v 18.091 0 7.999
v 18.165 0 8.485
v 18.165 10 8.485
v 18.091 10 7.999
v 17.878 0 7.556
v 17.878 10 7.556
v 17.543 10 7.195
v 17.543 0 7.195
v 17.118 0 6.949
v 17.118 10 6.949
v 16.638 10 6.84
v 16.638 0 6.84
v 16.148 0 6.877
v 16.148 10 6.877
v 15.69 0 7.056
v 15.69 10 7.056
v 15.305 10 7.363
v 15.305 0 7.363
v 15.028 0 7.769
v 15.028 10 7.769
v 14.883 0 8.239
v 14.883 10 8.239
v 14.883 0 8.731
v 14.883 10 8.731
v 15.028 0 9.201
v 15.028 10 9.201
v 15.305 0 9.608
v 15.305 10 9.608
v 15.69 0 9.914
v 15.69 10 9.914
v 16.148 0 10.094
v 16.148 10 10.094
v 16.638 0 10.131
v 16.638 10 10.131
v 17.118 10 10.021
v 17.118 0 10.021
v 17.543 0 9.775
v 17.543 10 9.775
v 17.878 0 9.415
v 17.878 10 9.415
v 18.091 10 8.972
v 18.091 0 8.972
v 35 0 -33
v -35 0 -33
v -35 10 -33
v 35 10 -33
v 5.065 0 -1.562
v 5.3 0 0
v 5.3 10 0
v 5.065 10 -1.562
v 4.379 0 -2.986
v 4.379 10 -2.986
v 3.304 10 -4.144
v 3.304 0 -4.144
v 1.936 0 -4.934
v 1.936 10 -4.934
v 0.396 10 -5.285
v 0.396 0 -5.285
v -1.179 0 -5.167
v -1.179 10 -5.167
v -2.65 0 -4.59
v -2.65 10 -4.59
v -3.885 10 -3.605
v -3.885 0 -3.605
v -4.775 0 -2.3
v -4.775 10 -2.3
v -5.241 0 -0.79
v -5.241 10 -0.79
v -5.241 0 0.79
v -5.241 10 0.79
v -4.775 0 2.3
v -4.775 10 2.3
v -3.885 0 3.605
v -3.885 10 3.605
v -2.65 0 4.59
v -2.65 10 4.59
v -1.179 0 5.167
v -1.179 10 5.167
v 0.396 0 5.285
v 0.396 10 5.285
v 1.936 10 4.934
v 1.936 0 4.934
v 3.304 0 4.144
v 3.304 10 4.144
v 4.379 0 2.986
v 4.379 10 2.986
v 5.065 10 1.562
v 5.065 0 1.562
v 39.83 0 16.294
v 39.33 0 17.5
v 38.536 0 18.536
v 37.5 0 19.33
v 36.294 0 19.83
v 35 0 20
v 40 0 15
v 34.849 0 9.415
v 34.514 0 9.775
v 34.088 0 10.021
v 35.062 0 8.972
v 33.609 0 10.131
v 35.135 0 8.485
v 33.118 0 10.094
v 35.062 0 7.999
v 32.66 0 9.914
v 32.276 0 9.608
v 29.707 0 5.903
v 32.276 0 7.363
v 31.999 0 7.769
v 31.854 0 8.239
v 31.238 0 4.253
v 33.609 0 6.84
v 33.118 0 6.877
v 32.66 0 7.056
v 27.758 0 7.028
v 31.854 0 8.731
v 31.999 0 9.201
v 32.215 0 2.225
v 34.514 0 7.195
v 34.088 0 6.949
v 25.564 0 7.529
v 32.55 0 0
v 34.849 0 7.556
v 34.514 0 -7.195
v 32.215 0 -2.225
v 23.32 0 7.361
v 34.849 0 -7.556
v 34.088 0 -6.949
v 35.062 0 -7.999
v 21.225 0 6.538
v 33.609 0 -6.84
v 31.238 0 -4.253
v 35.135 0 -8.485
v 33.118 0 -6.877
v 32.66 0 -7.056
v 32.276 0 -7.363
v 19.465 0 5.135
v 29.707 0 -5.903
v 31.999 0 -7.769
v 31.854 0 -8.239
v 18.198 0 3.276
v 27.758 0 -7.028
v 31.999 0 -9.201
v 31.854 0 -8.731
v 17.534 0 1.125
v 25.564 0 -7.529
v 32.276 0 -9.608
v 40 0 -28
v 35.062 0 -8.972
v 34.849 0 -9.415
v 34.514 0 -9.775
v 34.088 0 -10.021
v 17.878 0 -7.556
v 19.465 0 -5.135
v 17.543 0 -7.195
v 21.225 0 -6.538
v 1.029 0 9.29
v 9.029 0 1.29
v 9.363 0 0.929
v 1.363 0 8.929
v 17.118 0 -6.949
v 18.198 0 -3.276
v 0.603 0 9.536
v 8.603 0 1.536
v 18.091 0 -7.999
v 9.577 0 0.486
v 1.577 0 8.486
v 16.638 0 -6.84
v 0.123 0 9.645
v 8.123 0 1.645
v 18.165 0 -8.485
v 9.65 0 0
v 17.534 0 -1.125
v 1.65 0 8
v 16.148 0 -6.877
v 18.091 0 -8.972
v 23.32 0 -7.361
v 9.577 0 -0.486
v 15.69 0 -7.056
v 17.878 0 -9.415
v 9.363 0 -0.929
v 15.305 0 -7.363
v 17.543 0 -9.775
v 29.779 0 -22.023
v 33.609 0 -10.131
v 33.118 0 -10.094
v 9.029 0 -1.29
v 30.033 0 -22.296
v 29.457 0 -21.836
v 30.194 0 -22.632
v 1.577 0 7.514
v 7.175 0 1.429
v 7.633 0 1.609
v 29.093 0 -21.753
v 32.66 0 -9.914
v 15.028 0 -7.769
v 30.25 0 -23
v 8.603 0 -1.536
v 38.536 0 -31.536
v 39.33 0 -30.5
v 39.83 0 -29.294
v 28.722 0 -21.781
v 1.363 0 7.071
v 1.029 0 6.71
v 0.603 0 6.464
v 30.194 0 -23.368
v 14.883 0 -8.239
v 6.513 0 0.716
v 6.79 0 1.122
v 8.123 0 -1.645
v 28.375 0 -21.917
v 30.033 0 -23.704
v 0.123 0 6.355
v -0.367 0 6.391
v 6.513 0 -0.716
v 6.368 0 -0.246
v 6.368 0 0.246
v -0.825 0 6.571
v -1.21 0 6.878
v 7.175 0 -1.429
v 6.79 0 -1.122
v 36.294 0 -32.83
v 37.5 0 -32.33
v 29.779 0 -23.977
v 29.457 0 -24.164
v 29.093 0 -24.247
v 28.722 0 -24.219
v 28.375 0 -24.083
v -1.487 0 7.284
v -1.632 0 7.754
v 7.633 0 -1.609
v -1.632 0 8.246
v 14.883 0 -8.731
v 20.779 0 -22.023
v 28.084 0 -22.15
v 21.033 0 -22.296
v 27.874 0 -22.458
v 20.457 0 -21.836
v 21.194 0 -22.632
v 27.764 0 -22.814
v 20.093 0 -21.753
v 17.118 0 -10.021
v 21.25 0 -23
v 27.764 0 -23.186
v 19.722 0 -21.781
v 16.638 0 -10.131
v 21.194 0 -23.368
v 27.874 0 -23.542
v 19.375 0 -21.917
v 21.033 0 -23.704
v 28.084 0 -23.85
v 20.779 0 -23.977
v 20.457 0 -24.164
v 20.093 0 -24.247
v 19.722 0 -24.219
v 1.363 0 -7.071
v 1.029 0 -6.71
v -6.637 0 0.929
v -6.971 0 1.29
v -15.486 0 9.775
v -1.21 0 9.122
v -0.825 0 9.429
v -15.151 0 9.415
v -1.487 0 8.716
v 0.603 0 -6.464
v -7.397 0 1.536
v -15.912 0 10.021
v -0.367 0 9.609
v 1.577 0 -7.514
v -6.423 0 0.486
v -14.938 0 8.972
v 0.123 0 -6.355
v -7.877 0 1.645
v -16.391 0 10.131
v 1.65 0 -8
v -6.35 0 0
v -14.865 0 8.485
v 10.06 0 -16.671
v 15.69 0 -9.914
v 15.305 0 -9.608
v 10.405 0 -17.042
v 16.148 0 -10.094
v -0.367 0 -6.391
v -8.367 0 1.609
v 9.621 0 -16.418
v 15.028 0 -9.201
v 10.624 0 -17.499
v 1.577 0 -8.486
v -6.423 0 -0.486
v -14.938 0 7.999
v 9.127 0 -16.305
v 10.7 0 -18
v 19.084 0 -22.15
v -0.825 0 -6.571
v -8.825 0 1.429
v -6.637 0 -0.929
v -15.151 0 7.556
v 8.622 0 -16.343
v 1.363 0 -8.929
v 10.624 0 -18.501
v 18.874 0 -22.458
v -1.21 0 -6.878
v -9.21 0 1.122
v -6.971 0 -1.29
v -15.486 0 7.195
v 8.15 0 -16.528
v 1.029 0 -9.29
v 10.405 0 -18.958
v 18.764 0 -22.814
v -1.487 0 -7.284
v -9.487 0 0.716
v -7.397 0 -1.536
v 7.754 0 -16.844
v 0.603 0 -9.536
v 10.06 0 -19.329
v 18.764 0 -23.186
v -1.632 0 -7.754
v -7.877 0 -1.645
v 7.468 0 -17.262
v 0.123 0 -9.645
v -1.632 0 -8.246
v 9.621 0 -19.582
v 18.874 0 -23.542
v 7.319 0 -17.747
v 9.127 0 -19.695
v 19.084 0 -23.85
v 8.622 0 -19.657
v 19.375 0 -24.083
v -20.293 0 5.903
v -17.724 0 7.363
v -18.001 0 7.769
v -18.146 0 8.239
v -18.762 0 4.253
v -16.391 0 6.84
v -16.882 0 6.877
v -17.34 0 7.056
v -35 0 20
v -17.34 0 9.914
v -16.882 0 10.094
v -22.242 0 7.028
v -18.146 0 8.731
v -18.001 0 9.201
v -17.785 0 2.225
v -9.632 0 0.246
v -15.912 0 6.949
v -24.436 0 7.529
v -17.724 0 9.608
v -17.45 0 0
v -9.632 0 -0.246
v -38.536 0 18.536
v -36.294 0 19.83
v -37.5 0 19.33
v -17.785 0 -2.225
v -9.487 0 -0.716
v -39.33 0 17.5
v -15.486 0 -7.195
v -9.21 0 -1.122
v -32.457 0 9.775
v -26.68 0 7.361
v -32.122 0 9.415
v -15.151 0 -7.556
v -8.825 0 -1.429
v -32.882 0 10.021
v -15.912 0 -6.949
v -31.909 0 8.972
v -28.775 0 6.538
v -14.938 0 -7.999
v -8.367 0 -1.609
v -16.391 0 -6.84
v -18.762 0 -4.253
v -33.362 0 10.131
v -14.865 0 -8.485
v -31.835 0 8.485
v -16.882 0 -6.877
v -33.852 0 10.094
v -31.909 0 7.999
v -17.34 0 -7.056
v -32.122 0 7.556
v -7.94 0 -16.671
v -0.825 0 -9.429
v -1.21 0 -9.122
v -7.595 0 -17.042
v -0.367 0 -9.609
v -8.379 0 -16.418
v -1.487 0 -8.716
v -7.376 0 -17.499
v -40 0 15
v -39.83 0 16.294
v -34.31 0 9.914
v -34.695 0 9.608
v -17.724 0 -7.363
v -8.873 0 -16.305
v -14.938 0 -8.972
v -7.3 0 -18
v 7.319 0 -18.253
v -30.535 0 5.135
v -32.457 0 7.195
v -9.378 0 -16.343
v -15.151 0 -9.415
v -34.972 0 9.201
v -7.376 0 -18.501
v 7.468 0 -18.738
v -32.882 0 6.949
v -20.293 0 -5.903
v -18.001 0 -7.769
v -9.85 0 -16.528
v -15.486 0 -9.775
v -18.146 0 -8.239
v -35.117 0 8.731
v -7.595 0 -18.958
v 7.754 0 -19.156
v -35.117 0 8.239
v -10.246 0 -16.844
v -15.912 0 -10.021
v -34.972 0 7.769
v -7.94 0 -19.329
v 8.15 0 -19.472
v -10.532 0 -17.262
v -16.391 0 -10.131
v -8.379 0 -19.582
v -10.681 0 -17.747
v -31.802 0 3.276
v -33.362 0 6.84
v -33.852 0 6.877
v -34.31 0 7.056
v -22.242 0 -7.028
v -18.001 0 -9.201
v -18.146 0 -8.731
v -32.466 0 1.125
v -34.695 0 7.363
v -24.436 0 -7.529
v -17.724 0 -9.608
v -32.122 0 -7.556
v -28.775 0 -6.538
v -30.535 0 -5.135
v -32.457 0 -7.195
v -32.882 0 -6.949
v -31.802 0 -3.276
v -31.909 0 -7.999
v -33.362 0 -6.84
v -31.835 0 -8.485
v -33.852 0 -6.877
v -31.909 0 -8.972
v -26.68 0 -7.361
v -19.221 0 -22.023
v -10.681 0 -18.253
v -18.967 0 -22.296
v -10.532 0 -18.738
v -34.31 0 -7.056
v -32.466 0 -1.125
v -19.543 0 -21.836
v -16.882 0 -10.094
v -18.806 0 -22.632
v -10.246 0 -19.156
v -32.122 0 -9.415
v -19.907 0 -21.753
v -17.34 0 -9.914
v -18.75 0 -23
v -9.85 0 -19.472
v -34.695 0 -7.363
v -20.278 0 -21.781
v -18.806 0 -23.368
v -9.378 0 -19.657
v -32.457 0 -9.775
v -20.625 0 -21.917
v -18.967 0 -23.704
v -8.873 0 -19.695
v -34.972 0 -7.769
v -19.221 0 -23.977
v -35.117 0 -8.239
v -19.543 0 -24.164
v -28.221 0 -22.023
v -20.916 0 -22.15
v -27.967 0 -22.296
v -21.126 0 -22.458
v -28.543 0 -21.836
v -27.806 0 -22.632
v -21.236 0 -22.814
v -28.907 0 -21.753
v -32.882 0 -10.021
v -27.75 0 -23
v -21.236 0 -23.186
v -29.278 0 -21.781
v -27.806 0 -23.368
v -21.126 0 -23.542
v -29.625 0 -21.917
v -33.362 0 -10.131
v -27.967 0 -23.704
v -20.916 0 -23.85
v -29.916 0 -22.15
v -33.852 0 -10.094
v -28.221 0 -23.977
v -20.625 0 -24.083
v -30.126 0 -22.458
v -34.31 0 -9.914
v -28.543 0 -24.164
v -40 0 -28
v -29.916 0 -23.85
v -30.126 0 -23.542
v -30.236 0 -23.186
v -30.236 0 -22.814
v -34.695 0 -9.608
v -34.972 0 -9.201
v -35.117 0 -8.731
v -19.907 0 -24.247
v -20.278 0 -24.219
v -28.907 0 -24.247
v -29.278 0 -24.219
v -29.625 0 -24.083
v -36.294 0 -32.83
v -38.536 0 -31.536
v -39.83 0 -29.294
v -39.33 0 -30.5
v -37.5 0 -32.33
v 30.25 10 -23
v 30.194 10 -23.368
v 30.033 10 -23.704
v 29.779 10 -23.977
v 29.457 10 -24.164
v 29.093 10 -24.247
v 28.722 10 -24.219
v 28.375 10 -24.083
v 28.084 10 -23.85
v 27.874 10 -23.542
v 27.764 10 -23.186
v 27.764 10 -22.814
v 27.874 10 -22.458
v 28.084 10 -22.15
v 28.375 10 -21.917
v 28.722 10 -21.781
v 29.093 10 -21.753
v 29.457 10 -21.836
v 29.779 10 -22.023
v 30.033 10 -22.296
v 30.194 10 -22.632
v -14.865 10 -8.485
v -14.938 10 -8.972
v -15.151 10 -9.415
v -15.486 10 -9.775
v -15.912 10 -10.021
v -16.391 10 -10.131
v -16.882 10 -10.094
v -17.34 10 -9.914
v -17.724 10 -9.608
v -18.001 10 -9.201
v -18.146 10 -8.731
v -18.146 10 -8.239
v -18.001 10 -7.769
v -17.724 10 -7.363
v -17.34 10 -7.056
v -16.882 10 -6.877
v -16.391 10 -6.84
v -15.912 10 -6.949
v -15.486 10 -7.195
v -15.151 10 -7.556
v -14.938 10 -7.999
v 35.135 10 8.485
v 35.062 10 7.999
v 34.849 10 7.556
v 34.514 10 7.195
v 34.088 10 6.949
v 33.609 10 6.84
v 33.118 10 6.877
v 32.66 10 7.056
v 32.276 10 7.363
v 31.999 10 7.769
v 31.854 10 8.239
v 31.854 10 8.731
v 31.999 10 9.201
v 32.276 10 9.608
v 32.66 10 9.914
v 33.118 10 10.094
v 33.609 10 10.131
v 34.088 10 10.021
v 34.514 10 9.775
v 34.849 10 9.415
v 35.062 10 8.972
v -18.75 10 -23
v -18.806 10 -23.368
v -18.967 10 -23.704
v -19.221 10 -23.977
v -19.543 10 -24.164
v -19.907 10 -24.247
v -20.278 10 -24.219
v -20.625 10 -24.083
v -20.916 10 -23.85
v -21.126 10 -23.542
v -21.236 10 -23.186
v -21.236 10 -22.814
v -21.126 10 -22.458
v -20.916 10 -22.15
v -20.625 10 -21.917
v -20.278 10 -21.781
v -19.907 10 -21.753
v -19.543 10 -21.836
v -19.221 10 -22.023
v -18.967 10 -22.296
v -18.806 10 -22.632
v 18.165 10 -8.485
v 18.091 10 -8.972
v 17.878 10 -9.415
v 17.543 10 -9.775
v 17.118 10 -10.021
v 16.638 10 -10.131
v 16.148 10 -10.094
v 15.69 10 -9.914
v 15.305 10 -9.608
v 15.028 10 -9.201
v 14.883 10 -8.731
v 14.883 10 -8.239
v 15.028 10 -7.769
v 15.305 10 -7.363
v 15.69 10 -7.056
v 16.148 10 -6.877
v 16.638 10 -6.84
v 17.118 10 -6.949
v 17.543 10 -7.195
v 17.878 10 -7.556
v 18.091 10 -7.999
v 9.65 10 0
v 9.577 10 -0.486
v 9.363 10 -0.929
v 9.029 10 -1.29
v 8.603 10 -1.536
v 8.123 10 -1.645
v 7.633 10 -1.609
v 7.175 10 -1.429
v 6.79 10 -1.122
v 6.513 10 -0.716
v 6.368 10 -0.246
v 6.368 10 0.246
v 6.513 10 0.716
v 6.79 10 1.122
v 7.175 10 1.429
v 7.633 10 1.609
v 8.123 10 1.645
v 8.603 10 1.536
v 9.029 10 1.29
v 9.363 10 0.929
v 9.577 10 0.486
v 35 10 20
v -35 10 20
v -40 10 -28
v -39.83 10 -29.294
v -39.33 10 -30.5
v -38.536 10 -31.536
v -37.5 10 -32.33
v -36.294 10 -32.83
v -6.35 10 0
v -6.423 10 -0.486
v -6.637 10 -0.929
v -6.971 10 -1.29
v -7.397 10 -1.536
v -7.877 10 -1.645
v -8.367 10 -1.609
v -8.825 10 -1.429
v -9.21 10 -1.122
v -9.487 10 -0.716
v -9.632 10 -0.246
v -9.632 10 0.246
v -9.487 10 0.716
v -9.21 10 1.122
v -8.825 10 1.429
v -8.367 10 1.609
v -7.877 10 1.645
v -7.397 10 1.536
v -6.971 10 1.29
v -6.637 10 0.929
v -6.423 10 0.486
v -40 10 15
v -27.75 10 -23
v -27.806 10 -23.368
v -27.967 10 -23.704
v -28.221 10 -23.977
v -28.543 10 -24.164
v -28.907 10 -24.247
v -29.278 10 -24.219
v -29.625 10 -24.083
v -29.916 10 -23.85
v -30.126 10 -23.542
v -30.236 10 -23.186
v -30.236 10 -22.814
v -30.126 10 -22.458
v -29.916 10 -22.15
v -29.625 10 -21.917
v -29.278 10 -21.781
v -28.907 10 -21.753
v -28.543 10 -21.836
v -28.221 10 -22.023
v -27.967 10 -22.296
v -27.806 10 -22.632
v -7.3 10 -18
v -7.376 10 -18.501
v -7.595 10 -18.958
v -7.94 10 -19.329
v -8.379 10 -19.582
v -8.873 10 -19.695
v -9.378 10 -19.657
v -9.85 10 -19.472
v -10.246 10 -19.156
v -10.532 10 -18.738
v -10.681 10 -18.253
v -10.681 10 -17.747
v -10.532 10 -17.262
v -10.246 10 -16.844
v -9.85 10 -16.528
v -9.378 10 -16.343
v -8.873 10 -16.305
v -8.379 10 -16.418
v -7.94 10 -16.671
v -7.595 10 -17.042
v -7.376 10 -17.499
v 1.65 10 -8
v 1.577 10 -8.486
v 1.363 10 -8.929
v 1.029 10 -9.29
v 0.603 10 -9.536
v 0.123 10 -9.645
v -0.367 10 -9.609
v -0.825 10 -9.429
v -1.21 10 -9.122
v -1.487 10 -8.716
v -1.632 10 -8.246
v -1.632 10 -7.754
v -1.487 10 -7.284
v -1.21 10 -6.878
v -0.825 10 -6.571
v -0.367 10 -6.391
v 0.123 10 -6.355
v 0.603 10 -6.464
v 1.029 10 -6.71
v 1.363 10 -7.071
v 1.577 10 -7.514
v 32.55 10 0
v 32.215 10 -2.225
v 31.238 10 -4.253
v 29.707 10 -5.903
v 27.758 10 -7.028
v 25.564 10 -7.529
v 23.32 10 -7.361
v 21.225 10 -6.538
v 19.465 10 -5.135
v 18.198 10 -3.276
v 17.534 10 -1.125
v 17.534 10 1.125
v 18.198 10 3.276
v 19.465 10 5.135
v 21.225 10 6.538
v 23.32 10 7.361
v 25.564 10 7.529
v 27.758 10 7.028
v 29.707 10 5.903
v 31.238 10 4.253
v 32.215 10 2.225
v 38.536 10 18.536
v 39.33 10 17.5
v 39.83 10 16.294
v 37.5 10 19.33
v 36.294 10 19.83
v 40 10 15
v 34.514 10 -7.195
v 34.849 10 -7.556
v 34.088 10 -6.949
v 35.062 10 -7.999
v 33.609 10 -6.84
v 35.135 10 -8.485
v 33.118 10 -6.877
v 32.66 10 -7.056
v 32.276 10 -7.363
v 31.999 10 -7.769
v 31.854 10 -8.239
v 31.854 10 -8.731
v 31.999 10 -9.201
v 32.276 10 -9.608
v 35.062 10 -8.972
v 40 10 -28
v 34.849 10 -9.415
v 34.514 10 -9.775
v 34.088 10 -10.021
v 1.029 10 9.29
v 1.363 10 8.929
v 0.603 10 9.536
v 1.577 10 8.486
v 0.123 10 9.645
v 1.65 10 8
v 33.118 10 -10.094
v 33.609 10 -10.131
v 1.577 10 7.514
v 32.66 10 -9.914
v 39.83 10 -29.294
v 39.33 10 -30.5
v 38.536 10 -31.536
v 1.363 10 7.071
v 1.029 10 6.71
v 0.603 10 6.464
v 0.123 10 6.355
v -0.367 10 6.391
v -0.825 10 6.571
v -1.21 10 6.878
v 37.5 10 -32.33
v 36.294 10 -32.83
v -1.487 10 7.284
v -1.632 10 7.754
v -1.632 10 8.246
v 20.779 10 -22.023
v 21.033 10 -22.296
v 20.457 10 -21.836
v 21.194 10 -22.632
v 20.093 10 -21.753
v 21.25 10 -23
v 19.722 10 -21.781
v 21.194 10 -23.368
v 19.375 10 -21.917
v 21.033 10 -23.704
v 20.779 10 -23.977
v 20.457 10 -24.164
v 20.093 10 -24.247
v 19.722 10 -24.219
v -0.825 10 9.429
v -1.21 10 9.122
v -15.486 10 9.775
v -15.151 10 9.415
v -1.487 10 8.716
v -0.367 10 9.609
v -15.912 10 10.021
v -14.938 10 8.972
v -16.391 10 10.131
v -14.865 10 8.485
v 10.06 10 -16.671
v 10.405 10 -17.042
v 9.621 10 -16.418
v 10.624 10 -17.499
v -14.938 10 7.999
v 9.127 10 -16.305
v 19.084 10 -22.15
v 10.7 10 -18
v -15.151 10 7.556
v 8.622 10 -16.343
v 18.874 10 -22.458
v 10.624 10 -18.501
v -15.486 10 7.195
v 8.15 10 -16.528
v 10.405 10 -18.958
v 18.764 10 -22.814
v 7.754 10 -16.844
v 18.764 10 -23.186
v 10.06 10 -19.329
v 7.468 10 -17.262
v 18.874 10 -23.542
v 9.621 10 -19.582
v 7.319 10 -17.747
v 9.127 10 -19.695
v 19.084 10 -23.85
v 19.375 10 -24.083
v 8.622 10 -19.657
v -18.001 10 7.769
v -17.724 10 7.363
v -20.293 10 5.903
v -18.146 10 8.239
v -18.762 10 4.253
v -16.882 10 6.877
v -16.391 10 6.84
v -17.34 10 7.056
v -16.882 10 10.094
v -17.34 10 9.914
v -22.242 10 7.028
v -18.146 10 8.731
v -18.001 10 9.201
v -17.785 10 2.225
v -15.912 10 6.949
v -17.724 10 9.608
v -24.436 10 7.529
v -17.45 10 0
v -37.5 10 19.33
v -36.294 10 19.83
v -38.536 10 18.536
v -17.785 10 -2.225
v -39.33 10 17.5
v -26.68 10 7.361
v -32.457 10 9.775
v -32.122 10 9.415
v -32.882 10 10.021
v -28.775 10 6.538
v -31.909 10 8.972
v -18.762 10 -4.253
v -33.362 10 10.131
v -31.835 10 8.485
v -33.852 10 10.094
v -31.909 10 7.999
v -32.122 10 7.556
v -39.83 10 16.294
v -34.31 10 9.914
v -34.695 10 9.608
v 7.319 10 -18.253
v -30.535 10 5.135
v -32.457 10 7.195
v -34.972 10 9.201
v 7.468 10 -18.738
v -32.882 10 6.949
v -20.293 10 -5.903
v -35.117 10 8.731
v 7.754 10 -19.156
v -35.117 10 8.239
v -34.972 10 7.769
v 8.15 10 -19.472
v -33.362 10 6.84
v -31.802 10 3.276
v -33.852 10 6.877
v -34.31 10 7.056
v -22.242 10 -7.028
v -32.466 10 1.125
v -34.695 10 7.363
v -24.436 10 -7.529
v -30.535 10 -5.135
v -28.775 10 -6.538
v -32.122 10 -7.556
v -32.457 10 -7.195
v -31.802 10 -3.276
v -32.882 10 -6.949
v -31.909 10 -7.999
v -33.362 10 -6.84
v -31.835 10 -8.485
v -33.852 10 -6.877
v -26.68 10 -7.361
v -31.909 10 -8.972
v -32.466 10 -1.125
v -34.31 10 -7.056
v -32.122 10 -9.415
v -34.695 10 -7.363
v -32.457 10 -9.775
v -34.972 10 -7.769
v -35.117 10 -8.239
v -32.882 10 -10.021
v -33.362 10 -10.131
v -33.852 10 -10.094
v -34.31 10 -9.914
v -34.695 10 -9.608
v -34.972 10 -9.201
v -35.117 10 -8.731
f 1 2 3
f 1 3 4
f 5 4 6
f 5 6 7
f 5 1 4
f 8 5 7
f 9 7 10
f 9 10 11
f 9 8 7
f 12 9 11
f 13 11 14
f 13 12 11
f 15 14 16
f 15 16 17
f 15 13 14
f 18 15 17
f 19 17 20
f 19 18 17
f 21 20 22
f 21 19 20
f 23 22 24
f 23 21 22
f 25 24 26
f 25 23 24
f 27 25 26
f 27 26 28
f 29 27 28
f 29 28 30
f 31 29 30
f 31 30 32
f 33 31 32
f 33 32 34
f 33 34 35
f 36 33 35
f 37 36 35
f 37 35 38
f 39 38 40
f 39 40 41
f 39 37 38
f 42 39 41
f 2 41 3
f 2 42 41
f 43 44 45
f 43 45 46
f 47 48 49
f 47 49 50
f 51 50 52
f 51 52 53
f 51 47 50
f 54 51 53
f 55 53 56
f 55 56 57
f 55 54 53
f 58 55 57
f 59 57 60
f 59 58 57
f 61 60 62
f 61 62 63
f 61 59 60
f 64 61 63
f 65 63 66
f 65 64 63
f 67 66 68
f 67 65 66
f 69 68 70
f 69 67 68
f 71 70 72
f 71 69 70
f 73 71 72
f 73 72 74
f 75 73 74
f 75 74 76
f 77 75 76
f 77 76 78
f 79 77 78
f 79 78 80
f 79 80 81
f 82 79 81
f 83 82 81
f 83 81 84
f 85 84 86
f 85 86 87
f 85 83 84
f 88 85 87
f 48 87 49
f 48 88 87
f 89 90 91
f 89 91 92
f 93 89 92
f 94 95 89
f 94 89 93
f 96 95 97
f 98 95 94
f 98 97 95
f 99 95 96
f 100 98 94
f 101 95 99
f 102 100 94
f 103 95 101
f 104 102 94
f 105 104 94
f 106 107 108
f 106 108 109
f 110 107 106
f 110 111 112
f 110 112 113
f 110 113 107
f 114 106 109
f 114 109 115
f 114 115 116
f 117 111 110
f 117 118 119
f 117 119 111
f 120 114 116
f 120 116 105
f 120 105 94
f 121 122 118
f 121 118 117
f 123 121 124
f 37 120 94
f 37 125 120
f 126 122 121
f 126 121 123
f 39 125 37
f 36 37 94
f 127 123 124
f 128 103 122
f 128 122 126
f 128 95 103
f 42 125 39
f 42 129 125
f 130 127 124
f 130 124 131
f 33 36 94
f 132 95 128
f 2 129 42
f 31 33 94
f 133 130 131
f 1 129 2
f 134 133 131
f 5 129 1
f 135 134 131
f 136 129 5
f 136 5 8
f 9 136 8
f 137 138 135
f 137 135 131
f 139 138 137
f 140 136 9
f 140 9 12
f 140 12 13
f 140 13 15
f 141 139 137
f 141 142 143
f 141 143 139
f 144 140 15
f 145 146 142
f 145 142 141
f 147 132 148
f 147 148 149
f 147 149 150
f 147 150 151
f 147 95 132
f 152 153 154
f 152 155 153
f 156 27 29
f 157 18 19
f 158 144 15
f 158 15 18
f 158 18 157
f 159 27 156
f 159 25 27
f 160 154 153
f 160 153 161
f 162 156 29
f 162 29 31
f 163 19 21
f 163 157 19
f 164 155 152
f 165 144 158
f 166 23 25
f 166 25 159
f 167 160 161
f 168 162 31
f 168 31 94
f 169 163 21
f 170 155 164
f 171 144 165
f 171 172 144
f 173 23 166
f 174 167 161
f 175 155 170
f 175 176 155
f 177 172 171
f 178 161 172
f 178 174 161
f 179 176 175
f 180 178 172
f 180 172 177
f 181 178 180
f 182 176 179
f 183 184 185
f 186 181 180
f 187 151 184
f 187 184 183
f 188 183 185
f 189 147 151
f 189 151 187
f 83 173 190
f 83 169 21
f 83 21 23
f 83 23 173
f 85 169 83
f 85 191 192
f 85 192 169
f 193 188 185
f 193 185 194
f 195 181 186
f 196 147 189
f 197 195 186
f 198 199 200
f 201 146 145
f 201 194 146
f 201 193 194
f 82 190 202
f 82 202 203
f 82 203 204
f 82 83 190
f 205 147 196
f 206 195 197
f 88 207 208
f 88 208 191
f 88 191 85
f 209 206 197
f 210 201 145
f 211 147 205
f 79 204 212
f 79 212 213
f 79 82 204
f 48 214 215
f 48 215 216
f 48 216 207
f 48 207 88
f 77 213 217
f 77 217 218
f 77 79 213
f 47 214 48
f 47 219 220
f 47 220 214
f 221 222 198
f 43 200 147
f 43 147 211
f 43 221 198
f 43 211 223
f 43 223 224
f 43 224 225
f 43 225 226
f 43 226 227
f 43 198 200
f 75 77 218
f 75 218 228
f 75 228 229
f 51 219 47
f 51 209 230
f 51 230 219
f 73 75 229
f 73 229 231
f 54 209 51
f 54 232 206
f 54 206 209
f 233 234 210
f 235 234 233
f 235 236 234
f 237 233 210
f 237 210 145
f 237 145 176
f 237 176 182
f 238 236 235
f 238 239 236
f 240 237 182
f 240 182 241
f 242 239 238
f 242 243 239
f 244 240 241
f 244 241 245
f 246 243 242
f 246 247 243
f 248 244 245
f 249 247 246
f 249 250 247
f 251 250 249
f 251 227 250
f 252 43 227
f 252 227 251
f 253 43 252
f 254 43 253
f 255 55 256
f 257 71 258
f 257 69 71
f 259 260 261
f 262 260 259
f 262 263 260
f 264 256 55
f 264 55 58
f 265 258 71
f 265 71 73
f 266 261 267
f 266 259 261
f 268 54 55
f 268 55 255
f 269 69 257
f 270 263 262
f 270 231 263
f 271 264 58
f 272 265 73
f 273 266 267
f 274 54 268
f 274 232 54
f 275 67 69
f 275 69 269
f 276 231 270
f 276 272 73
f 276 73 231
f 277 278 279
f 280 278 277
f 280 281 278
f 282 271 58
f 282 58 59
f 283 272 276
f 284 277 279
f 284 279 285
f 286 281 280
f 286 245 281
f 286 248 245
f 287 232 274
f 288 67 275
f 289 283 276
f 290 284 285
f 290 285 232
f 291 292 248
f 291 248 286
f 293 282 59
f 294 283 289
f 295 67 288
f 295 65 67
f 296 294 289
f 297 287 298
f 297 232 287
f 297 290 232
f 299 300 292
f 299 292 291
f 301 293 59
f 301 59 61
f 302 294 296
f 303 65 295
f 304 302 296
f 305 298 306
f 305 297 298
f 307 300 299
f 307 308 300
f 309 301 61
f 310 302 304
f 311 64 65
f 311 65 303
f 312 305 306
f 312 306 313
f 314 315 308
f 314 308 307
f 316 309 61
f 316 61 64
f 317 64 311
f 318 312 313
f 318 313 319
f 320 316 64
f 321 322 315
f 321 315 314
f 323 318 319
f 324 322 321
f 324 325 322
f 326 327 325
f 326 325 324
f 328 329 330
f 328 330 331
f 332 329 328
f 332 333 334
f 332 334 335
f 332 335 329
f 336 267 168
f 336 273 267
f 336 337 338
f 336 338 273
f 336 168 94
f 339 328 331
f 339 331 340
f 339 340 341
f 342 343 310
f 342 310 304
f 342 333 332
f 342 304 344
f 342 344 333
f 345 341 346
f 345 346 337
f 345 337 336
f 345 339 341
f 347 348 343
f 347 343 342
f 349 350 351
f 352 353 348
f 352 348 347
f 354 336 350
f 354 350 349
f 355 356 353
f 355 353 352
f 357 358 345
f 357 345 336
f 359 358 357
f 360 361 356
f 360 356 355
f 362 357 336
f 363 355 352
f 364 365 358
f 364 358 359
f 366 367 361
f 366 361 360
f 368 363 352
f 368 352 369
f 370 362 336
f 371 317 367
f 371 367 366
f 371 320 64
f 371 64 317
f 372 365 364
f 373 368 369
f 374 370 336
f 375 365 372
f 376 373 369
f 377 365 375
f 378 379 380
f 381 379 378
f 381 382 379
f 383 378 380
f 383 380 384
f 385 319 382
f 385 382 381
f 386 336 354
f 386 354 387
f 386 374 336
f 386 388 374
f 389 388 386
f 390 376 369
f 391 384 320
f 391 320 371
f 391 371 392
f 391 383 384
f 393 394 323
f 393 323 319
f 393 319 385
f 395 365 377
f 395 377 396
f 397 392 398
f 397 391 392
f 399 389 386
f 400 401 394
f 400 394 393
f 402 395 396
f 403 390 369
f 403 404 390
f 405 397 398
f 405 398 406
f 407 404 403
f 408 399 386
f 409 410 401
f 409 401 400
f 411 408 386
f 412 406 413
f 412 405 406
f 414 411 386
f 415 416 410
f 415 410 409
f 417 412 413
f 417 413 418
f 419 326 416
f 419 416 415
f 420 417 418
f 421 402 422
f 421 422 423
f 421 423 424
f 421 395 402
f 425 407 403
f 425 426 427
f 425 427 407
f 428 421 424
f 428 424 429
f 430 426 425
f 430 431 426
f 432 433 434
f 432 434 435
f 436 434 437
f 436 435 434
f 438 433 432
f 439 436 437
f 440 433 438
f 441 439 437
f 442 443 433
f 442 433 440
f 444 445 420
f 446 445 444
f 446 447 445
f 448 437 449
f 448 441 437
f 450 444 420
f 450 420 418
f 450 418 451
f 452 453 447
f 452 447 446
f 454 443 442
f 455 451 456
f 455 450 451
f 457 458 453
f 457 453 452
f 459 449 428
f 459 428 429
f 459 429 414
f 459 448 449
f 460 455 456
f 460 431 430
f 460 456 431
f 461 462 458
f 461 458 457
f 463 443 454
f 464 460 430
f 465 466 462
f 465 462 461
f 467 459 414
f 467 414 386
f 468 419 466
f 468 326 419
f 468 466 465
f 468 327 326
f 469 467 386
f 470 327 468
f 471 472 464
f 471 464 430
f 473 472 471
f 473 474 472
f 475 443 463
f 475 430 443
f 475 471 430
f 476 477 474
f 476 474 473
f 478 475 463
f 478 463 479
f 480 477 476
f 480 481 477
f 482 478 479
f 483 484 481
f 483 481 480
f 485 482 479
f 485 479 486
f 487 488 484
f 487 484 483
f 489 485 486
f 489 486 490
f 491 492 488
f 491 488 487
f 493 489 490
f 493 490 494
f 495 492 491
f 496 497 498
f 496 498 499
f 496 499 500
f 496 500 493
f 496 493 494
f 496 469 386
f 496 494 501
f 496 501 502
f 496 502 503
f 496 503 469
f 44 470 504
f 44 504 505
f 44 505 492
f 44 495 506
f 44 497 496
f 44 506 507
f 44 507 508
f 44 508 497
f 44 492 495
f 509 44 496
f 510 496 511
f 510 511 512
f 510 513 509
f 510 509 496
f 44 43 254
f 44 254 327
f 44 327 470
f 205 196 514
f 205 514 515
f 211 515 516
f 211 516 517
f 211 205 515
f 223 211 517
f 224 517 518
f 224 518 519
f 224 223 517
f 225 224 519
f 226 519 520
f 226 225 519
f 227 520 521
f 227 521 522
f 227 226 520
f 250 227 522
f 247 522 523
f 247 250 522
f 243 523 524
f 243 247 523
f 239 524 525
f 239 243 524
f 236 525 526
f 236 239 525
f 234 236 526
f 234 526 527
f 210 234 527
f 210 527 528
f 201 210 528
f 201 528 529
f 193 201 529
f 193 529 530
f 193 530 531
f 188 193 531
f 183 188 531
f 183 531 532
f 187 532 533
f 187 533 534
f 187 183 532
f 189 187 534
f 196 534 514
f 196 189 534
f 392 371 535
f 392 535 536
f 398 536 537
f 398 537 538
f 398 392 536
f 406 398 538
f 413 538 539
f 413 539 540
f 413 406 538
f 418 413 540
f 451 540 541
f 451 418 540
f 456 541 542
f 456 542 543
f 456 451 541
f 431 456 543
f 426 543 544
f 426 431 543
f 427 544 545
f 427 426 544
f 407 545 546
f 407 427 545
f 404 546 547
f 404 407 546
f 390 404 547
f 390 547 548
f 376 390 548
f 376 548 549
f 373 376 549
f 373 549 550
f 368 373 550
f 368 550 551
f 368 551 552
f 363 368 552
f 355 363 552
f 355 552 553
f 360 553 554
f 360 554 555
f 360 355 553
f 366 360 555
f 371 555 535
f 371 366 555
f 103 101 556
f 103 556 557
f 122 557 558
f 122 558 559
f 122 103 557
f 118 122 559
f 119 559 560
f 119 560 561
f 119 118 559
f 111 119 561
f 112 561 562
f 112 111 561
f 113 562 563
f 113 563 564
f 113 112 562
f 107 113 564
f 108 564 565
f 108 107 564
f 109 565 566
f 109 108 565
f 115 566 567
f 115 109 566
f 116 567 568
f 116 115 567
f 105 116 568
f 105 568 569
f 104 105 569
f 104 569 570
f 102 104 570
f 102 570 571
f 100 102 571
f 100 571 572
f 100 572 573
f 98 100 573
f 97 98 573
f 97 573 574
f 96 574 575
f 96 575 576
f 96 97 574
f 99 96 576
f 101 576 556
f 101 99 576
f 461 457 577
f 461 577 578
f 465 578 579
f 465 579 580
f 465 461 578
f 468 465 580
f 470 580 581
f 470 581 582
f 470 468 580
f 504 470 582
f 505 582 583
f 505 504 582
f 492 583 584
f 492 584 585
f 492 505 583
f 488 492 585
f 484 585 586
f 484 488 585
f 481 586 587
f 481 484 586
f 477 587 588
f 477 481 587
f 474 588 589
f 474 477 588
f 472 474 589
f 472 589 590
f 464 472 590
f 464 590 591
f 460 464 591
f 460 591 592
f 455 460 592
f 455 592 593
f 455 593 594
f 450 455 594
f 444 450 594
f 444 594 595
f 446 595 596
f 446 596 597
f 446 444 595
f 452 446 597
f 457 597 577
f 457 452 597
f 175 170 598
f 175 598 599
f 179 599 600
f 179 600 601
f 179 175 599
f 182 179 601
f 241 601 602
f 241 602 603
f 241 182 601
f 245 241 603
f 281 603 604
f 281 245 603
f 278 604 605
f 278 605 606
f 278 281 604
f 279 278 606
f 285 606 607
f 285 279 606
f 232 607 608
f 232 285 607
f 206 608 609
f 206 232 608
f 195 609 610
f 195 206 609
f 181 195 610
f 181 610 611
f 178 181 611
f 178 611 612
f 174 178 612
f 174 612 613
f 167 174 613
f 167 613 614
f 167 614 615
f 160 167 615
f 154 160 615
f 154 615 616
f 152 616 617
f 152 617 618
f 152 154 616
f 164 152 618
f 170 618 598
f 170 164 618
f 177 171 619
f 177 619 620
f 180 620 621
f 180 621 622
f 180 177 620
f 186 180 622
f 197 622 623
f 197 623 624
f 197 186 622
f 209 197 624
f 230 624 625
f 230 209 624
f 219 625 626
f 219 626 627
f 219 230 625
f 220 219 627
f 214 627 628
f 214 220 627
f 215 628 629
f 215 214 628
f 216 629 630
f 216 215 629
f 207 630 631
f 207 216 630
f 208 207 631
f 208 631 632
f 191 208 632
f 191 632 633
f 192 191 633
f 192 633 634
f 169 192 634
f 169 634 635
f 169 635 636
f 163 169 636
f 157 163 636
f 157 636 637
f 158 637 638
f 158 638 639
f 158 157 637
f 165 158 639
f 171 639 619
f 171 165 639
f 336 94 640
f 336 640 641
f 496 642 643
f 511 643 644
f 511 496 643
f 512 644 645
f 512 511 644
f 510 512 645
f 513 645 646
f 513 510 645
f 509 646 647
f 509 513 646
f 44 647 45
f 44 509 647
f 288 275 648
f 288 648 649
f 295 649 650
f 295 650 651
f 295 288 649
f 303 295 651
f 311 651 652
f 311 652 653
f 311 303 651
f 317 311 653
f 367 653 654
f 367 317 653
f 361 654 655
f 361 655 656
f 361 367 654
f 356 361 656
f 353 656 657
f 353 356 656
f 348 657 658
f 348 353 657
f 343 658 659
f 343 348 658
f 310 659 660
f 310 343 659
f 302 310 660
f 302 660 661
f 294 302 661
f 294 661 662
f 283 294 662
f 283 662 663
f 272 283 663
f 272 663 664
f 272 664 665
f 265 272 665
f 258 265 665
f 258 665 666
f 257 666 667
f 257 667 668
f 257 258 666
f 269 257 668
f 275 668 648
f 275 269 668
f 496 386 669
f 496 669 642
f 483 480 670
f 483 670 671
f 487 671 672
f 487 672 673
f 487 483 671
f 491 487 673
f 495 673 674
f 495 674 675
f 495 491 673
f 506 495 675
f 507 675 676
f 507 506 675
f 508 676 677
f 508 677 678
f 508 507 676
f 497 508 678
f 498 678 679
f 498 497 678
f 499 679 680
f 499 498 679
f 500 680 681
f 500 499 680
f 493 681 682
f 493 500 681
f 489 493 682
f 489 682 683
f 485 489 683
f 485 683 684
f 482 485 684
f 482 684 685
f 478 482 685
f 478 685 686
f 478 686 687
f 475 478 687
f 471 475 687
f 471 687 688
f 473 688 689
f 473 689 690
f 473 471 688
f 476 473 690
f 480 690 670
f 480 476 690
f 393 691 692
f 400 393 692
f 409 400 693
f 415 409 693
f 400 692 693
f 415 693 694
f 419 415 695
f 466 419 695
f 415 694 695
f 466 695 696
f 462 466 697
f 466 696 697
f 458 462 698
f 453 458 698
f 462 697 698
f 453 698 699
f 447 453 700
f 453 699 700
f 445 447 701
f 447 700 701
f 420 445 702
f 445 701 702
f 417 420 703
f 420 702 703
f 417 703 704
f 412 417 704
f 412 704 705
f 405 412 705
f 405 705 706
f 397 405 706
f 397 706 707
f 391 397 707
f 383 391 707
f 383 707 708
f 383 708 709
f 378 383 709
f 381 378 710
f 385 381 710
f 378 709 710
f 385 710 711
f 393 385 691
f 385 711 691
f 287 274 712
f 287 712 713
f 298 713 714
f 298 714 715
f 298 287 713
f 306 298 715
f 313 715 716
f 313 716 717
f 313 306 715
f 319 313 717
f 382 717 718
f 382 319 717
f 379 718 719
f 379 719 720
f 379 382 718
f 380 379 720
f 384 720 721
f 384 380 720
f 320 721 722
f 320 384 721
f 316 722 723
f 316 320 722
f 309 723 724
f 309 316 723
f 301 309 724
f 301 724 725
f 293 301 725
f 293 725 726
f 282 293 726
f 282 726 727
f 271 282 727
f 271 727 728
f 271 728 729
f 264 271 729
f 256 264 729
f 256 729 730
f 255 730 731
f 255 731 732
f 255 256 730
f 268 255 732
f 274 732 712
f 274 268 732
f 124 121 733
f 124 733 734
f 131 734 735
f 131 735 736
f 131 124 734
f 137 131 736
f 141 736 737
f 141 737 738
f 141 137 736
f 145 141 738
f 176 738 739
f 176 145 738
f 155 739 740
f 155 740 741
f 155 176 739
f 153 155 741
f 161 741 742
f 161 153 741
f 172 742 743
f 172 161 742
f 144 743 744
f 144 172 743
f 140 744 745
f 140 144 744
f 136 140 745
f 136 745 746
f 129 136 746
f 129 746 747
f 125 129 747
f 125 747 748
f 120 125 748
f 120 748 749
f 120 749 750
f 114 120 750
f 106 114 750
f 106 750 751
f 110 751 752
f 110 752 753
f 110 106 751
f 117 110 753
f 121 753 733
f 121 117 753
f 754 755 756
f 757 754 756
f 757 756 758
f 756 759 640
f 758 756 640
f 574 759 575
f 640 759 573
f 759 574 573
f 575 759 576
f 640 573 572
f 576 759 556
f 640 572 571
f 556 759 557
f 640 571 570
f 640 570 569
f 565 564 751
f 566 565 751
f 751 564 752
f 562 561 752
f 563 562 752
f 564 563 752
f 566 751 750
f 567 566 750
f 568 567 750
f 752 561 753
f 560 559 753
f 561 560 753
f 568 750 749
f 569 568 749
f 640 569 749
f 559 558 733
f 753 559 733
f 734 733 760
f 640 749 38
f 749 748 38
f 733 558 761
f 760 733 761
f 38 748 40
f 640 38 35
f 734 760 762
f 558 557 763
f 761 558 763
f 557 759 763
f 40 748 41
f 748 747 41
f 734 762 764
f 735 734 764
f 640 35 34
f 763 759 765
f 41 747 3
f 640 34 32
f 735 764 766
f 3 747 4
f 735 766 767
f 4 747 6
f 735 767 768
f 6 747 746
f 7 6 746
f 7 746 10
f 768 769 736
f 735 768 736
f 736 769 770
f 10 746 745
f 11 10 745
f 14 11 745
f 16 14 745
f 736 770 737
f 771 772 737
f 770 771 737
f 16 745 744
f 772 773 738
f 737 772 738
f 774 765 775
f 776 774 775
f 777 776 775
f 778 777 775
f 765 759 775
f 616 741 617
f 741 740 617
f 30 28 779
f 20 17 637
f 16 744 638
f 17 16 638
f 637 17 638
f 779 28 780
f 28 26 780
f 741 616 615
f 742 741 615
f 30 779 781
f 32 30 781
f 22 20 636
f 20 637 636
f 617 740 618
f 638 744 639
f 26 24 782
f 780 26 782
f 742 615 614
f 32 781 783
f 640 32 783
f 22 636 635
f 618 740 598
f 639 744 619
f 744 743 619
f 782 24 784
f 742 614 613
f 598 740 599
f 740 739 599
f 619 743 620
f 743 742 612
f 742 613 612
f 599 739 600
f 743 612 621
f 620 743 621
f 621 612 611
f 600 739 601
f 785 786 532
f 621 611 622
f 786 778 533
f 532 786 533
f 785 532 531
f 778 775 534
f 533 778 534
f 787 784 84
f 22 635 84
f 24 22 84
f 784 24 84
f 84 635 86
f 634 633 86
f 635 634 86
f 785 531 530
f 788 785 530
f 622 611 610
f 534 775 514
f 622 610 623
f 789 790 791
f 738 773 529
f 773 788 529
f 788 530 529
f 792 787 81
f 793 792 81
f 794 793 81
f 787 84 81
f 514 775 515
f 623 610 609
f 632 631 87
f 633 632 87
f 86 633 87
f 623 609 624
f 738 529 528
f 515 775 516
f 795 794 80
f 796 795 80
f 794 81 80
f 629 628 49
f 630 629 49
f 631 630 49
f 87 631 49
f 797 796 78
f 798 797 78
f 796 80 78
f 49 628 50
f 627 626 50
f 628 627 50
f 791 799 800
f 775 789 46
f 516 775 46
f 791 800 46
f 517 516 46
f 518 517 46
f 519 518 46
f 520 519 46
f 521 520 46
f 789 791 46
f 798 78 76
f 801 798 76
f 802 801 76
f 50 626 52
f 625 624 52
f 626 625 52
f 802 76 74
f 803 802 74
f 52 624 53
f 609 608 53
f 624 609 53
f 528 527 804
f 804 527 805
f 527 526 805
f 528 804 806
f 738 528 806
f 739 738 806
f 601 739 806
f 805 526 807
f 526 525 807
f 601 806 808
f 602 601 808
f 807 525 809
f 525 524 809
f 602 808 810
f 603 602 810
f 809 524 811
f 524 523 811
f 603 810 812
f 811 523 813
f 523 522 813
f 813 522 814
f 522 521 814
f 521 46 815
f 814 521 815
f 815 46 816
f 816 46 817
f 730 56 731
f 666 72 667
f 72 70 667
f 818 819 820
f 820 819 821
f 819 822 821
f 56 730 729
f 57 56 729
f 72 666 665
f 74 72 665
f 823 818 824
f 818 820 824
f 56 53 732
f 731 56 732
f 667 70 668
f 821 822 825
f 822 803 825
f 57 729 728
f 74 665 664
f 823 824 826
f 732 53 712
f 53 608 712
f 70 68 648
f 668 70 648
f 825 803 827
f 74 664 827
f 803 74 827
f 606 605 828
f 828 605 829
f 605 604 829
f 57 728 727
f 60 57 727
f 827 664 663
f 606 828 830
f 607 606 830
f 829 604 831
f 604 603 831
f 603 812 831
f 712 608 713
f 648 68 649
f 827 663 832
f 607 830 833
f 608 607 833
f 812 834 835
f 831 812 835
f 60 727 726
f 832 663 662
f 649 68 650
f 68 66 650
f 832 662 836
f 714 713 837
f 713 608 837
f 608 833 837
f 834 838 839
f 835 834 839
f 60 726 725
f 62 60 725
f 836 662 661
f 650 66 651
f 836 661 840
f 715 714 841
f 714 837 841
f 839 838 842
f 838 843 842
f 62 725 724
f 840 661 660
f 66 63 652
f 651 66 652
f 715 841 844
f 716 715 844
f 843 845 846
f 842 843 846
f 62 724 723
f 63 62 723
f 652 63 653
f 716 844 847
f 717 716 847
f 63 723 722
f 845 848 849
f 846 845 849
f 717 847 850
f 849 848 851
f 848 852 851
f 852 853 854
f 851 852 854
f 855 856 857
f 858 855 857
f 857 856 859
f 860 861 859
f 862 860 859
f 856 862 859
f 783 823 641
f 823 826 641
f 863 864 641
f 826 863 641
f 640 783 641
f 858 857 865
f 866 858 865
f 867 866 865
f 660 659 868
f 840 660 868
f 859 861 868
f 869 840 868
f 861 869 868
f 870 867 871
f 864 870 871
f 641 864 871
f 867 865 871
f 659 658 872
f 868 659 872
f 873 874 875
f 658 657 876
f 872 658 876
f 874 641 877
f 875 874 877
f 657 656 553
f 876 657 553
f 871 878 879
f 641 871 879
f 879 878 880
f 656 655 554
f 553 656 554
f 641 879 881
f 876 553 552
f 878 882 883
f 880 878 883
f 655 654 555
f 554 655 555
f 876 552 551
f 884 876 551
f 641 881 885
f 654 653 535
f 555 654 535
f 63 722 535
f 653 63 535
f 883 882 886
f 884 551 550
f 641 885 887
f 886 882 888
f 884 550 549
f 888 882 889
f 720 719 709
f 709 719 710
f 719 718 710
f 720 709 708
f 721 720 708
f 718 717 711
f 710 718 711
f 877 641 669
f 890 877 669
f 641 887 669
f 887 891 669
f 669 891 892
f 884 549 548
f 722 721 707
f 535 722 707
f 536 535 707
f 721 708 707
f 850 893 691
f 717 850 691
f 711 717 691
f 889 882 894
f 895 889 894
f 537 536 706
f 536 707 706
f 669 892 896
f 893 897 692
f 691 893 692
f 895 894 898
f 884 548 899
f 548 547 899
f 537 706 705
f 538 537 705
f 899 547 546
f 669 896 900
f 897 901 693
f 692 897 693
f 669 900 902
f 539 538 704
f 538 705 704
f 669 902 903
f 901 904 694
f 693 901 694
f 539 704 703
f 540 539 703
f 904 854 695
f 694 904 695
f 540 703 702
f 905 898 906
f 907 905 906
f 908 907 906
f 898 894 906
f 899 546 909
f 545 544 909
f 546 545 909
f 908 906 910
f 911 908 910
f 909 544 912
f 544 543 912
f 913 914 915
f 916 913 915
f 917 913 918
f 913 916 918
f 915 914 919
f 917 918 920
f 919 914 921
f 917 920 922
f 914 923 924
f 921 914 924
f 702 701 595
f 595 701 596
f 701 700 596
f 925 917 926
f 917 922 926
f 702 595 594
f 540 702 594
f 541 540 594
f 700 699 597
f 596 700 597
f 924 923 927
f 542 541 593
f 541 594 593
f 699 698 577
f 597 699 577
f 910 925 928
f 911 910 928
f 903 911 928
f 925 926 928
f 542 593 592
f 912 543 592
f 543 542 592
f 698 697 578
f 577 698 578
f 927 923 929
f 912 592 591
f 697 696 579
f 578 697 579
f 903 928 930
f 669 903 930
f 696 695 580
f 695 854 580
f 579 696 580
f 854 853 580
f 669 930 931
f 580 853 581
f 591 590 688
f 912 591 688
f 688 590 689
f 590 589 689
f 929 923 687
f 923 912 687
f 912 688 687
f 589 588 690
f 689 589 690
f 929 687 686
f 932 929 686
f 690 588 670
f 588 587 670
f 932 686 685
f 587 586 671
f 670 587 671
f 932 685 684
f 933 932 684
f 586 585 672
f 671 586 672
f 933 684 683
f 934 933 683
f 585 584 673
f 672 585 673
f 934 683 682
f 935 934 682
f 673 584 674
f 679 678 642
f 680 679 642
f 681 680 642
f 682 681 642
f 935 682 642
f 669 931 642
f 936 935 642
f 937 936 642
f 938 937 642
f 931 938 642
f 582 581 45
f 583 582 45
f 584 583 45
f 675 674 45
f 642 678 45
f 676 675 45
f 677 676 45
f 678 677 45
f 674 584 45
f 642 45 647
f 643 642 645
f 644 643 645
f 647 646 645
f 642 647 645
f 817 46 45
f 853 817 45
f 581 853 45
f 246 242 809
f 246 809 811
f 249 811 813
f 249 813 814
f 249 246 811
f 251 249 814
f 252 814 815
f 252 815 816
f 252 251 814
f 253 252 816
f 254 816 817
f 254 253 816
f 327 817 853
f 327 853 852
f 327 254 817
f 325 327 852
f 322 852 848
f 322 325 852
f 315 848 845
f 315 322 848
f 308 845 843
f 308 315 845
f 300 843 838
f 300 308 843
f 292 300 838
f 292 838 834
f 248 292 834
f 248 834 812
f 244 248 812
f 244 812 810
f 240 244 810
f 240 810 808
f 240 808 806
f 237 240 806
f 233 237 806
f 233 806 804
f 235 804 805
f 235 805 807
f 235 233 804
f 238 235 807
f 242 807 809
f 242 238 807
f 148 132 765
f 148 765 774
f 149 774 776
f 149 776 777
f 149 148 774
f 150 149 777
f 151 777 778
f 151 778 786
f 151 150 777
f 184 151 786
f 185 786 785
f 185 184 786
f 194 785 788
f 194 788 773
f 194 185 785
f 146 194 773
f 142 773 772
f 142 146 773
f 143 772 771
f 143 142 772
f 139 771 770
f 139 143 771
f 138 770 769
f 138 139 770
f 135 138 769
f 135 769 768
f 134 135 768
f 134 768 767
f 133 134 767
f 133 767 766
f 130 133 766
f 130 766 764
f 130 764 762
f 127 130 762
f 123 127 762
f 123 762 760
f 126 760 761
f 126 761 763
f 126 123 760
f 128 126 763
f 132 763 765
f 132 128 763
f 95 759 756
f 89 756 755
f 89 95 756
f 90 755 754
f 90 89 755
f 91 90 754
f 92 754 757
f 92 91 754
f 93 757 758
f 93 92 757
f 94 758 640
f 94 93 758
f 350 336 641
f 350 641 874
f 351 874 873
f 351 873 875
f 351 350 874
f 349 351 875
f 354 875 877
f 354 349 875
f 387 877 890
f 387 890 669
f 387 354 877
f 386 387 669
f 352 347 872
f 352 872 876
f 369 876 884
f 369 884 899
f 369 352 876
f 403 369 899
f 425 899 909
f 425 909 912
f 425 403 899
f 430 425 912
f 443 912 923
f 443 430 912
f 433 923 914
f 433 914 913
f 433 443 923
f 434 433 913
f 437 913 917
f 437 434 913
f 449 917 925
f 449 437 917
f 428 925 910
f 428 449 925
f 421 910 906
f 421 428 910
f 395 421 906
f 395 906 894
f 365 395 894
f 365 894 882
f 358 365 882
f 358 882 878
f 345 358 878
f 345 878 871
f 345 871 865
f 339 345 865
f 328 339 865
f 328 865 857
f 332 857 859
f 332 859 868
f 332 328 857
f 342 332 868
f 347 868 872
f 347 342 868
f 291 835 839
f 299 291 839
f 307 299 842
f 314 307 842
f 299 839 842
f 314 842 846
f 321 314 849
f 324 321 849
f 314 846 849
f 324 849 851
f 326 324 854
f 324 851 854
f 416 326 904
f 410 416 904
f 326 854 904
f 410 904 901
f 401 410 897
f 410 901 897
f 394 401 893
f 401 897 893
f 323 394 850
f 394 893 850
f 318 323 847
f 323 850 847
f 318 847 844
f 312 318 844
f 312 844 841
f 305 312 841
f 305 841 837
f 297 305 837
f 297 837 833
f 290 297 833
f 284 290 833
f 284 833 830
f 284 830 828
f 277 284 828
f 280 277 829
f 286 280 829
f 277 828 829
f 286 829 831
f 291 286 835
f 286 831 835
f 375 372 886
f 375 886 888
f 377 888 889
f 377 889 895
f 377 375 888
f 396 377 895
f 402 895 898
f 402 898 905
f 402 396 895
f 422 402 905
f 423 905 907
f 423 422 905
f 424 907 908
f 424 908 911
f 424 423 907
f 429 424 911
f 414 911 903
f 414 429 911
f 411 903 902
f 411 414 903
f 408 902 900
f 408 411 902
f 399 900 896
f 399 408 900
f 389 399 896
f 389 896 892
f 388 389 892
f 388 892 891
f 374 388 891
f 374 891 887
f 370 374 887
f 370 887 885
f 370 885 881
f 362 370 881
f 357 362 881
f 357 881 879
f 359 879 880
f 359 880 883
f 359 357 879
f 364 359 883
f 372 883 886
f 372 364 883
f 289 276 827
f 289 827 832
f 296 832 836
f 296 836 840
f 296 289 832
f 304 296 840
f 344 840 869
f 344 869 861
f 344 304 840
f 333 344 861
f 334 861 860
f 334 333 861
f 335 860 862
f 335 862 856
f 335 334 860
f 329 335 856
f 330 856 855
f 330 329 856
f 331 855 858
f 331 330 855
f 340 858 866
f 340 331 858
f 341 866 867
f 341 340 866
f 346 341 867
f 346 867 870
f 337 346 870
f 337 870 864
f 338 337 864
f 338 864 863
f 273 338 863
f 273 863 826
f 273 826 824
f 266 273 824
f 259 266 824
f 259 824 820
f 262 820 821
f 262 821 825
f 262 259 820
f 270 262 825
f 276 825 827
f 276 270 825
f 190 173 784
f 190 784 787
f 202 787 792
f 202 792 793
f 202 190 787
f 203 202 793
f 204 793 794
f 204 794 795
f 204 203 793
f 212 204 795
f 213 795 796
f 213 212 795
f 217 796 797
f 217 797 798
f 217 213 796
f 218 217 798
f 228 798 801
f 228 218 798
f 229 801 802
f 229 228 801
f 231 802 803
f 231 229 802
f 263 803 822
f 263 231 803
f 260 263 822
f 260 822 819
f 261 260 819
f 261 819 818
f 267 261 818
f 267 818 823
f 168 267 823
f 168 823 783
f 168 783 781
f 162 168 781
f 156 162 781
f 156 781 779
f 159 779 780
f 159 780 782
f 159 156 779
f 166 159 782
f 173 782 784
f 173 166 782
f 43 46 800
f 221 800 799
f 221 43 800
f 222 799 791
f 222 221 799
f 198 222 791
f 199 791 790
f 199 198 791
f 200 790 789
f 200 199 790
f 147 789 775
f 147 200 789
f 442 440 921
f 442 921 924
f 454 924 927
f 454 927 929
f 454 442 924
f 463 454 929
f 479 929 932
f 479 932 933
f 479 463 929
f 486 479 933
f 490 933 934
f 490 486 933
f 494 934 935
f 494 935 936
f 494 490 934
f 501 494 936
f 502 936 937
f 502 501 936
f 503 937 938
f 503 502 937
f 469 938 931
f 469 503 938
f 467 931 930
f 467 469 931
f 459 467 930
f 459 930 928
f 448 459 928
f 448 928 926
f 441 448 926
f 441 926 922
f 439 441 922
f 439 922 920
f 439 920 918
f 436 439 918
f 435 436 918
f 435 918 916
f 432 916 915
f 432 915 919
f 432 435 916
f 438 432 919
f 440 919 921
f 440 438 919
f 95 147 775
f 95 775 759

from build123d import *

# Parameters (mm, degrees)
SKETCH_1_R          = 5.3
SKETCH_1_R_2        = 1.65
SKETCH_1_R_3        = 7.55
SKETCH_1_R_4        = 1.25
EXTRUDE_1_DEPTH     = 10
SKETCH_2_R          = 1.7
CUT_EXTRUDE_1_DEPTH = 10


with BuildPart() as part:
    # 草图1 → 凸台-拉伸1 (new body)
    with BuildSketch(Plane(origin=(0, 0, 0), x_dir=(1, 0, 0), z_dir=(0, 1, 0))):
        with BuildLine():
            Line((-35, 33), (35, 33))
            ThreePointArc((35, 33), (38.535533906, 31.535533906), (40, 28))
            Line((40, 28), (40, -15))
            ThreePointArc((40, -15), (38.535533906, -18.535533906), (35, -20))
            Line((35, -20), (-35, -20))
            ThreePointArc((-35, -20), (-38.535533906, -18.535533906), (-40, -15))
            Line((-40, -15), (-40, 28))
            ThreePointArc((-40, 28), (-38.535533906, 31.535533906), (-35, 33))
        make_face()
        Circle(SKETCH_1_R, mode=Mode.SUBTRACT)
        with Locations((0, 8)):
            Circle(SKETCH_1_R_2, mode=Mode.SUBTRACT)
        with Locations((8, 0)):
            Circle(SKETCH_1_R_2, mode=Mode.SUBTRACT)
        with Locations((0, -8)):
            Circle(SKETCH_1_R_2, mode=Mode.SUBTRACT)
        with Locations((-8, 0)):
            Circle(SKETCH_1_R_2, mode=Mode.SUBTRACT)
        with Locations((-25, 0)):
            Circle(SKETCH_1_R_3, mode=Mode.SUBTRACT)
        with Locations((-33.485281374, 8.485281374)):
            Circle(SKETCH_1_R_2, mode=Mode.SUBTRACT)
        with Locations((-16.514718626, 8.485281374)):
            Circle(SKETCH_1_R_2, mode=Mode.SUBTRACT)
        with Locations((-16.514718626, -8.485281374)):
            Circle(SKETCH_1_R_2, mode=Mode.SUBTRACT)
        with Locations((-33.485281374, -8.485281374)):
            Circle(SKETCH_1_R_2, mode=Mode.SUBTRACT)
        with Locations((25, 0)):
            Circle(SKETCH_1_R_3, mode=Mode.SUBTRACT)
        with Locations((16.514718626, 8.485281374)):
            Circle(SKETCH_1_R_2, mode=Mode.SUBTRACT)
        with Locations((16.514718626, -8.485281374)):
            Circle(SKETCH_1_R_2, mode=Mode.SUBTRACT)
        with Locations((33.485281374, -8.485281374)):
            Circle(SKETCH_1_R_2, mode=Mode.SUBTRACT)
        with Locations((33.485281374, 8.485281374)):
            Circle(SKETCH_1_R_2, mode=Mode.SUBTRACT)
        with Locations((-20, 23)):
            Circle(SKETCH_1_R_4, mode=Mode.SUBTRACT)
        with Locations((20, 23)):
            Circle(SKETCH_1_R_4, mode=Mode.SUBTRACT)
        with Locations((-29, 23)):
            Circle(SKETCH_1_R_4, mode=Mode.SUBTRACT)
        with Locations((29, 23)):
            Circle(SKETCH_1_R_4, mode=Mode.SUBTRACT)
    extrude(amount=EXTRUDE_1_DEPTH)

    # 草图2 → 切除-拉伸1 (cut)
    with BuildSketch(Plane(origin=(0, 10, 0), x_dir=(1, 0, 0), z_dir=(0, 1, 0))):
        with Locations((-9, 18)):
            Circle(SKETCH_2_R)
        with Locations((9, 18)):
            Circle(SKETCH_2_R)
    extrude(amount=-CUT_EXTRUDE_1_DEPTH, mode=Mode.SUBTRACT)


solid = part.part
